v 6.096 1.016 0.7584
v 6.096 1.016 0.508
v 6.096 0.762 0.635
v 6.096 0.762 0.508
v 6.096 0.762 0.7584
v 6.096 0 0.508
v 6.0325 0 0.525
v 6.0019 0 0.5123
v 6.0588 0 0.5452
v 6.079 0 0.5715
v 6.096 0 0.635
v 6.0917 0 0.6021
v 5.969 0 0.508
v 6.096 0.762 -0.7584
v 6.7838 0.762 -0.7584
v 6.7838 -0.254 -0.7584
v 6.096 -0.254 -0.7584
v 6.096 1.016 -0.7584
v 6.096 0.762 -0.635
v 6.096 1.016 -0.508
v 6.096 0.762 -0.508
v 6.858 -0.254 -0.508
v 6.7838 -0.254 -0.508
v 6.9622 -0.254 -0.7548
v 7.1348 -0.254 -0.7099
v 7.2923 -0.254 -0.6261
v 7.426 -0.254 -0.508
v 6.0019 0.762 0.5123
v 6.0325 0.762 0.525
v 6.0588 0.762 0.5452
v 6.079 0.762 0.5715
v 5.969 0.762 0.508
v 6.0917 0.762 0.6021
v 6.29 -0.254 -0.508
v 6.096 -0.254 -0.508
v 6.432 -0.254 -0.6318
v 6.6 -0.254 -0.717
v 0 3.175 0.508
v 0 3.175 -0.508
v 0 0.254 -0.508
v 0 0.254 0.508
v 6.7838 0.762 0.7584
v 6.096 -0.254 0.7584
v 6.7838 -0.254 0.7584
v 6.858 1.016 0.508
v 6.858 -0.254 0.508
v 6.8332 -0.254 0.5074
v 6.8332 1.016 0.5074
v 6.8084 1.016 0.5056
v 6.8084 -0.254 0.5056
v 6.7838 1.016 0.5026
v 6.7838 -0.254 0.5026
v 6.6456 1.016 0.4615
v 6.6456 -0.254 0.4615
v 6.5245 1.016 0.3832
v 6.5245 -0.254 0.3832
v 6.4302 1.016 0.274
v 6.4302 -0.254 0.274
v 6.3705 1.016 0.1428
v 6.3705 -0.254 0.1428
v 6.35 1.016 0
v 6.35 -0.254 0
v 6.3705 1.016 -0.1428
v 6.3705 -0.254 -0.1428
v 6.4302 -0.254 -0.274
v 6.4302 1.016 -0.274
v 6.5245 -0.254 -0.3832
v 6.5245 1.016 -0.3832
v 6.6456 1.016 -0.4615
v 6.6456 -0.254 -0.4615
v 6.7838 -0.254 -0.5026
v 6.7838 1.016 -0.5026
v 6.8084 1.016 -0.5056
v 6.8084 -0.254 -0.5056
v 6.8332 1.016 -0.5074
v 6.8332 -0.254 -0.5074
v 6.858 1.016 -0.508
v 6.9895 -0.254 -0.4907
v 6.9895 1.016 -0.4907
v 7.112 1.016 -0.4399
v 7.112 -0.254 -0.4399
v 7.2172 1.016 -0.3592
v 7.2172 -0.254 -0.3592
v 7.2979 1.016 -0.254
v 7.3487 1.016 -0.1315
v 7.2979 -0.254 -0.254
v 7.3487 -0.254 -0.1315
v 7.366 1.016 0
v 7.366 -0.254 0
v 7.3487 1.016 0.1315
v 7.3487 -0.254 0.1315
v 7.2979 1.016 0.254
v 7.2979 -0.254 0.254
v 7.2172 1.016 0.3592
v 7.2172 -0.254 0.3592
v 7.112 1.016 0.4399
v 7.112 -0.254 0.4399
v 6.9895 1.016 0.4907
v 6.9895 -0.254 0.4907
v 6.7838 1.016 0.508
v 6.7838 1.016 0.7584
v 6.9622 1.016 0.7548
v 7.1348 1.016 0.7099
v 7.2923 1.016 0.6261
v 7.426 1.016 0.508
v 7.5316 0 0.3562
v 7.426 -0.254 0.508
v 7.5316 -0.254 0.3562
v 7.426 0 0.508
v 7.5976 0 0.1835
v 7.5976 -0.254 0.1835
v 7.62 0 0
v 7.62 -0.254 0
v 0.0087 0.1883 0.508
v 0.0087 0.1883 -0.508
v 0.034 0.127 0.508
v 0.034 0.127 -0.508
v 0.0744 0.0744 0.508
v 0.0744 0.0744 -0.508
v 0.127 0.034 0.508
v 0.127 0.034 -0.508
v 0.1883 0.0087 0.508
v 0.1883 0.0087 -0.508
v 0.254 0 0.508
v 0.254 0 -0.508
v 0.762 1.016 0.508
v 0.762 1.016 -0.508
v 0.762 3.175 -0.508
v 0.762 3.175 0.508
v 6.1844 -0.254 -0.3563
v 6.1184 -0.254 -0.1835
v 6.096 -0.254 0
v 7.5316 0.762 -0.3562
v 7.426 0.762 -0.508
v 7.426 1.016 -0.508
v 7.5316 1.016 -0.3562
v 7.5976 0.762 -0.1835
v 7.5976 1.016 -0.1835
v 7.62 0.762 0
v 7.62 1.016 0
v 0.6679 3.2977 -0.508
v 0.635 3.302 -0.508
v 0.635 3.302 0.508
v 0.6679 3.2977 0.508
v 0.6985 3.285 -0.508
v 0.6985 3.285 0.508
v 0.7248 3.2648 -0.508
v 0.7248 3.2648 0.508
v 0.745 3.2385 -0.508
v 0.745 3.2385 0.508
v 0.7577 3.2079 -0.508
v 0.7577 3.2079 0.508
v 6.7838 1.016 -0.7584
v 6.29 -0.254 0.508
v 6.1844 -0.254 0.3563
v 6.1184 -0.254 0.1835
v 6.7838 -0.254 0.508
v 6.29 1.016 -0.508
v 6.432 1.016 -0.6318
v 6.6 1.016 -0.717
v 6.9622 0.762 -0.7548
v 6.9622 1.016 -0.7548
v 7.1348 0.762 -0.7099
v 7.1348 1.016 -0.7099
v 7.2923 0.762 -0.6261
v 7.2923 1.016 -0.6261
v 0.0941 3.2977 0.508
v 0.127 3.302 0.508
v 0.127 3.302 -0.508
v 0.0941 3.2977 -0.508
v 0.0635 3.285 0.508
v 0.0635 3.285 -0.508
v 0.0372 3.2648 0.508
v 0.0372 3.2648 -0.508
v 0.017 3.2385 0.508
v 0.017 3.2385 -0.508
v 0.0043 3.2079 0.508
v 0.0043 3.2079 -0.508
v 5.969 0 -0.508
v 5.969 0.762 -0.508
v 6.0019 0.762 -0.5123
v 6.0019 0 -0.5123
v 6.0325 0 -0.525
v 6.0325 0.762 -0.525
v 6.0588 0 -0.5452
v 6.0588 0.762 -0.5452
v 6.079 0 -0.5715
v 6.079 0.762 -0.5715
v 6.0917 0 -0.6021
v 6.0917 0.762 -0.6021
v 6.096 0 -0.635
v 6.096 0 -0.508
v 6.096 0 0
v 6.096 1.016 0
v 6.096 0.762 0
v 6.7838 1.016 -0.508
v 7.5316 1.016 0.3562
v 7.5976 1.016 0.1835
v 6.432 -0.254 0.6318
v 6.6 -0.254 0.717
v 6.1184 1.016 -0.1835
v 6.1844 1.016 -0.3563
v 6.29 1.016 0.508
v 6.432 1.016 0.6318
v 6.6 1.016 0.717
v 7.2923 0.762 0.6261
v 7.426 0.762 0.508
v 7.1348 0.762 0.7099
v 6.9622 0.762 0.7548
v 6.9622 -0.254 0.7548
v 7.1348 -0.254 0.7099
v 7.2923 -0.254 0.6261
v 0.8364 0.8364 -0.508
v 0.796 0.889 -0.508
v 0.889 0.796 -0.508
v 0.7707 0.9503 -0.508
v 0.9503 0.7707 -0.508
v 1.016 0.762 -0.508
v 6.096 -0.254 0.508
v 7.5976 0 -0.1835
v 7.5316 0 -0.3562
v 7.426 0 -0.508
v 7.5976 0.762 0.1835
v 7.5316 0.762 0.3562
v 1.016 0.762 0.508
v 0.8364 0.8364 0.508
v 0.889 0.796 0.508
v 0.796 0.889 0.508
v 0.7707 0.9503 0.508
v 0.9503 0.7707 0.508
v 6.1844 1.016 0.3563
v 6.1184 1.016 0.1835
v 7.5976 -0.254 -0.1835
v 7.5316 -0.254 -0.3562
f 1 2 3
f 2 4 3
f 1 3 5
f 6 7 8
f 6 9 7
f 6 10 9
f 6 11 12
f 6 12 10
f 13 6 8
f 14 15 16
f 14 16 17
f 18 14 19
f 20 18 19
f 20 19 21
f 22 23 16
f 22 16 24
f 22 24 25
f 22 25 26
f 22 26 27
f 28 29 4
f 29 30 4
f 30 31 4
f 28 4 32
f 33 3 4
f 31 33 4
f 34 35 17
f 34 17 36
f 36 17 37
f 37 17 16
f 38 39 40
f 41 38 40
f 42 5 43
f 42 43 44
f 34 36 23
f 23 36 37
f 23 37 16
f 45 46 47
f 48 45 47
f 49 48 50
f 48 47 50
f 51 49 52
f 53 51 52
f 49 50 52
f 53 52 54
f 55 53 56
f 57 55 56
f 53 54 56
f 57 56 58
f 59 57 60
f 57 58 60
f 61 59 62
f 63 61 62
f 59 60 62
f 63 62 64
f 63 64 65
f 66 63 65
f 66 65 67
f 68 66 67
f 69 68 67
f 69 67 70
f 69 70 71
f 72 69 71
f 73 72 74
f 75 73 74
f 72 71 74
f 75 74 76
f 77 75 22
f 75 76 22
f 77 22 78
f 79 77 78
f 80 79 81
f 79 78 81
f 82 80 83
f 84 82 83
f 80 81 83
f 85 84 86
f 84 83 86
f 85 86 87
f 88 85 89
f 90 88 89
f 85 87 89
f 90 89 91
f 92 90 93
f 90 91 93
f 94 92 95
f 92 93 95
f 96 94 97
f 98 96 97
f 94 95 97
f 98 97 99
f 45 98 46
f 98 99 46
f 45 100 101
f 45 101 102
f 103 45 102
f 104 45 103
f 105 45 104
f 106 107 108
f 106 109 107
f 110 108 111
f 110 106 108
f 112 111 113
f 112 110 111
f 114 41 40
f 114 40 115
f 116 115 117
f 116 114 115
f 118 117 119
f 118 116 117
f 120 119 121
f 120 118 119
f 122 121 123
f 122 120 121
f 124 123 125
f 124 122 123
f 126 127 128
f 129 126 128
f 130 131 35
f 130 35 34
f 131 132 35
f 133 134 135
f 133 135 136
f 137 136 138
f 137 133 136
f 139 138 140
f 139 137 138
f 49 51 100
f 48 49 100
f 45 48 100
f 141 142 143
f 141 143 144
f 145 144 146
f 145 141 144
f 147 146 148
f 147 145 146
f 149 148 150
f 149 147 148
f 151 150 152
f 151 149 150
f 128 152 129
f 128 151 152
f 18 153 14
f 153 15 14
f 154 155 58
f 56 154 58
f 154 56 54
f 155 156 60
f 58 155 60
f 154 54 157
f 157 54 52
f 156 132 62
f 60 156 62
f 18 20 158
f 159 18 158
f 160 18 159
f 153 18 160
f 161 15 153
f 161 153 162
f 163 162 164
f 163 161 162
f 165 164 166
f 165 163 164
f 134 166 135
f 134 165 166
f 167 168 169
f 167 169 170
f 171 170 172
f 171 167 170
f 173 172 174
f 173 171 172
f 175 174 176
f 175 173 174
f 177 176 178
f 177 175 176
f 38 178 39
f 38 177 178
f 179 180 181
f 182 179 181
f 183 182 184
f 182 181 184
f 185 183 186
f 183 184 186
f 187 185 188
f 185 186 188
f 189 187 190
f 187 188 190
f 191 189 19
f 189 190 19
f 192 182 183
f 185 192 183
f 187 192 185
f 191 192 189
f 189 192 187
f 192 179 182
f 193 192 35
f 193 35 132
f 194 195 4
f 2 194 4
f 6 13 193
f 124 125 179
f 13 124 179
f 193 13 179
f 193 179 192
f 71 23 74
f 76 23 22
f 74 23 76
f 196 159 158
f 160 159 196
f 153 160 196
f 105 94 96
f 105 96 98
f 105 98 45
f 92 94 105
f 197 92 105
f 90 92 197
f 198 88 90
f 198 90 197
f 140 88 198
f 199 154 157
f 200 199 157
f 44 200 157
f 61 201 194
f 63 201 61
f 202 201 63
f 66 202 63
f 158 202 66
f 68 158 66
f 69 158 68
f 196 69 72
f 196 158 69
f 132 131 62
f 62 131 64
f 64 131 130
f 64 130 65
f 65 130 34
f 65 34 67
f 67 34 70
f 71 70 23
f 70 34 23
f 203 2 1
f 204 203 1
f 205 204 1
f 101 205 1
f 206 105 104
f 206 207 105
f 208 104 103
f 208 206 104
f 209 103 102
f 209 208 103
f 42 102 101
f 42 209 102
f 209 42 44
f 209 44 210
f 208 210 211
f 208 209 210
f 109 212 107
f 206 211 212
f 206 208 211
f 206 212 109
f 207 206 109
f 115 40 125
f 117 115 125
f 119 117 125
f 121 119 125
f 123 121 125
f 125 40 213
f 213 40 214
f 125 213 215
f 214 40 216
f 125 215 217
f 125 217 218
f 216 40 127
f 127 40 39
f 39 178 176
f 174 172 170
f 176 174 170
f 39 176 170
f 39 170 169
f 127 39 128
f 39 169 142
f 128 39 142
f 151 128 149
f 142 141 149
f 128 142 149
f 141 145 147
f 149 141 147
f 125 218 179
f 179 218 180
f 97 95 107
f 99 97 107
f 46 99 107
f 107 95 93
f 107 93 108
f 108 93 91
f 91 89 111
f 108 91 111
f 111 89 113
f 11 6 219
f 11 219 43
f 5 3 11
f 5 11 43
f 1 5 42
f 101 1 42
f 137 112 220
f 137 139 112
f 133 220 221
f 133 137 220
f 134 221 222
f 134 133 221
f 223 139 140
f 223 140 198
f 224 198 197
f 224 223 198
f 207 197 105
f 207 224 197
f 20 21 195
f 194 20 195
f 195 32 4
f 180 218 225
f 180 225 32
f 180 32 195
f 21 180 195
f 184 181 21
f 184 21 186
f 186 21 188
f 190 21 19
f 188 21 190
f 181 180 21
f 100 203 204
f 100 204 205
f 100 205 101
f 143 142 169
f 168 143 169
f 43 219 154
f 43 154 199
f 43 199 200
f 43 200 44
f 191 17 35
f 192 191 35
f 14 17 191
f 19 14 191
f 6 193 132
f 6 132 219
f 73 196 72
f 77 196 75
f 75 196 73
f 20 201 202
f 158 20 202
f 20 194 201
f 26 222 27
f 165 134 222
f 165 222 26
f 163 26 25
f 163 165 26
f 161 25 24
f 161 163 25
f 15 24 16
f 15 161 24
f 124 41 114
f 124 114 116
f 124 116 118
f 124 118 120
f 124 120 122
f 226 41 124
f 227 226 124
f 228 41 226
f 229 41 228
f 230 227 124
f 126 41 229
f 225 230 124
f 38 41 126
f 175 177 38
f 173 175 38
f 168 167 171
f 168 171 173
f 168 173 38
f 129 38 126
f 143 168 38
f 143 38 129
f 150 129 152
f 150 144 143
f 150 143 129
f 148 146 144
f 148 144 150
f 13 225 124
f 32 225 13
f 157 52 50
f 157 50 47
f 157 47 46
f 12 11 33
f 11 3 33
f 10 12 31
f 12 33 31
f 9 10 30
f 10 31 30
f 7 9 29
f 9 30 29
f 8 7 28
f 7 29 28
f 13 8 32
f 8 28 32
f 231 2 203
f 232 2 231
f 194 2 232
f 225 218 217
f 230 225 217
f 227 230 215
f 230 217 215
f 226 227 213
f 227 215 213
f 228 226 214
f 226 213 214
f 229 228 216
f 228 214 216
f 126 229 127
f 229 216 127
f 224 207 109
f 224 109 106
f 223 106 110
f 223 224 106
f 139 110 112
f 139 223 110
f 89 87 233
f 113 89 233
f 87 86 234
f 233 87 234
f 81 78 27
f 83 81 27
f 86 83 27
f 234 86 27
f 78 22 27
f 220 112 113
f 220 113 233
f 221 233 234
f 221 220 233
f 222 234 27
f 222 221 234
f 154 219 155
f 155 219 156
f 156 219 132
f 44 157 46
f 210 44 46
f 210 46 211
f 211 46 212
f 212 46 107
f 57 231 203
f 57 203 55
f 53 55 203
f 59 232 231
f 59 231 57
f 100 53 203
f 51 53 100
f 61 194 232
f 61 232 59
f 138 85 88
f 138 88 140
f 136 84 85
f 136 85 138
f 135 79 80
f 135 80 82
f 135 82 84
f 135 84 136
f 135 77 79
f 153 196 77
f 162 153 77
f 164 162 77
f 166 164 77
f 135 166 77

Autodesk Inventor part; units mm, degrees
ref_plane "YZ Plane" through (0, 0, 0) normal (1, 0, 0) x (0, 1, 0)
ref_plane "XZ Plane" through (0, 0, 0) normal (0, 1, 0) x (-1, 0, 0)
ref_plane "XY Plane" through (0, 0, 0) normal (0, 0, 1) x (1, 0, 0)
sketch "Sketch1" plane through (0, 0, 0) normal (0, 0, 1) x (1, 0, 0)
  line L0 (0, 4.0132) -> (0, -0.9652) projected
  line L1 (-1.524, 0) -> (9.144, 0) projected
  line L2 (7.62, 0) -> (0, 0)
  line L3 (0, 0) -> (0, 0.762)
  line L4 (0, 0.762) -> (7.62, 0.762)
  line L5 (7.62, 0.762) -> (7.62, 0)
  line L6 (0, 0.762) -> (0.762, 0.762)
  line L7 (0.762, 0.762) -> (0.762, 3.302)
  line L8 (0.762, 3.302) -> (0, 3.302)
  line L9 (0, 3.302) -> (0, 0.762)
  line L10 (6.096, -0.254) -> (7.62, -0.254)
  line L11 (7.62, -0.254) -> (7.62, 1.016)
  line L12 (7.62, 1.016) -> (6.096, 1.016)
  line L13 (6.096, 1.016) -> (6.096, -0.254)
  line L14 (6.096, -0.254) -> (7.62, 1.016) construction
  line L15 (7.62, -0.254) -> (6.096, 1.016) construction
  line L16 (0, 0.381) -> (7.62, 0.381) construction
  point P0 (6.858, 0.381)
  dimension "d0" = 0.762
  dimension "d1" = 0.762
  dimension "d2" = 3.302
  dimension "d4" = 1.27
  dimension "d5" = 1.524
  dimension "d6" = 6.858
  dimension "d7" = 0
extrude "Extrusion1" add sketch "Sketch1" along normal mid plane 1.016 contours L8 L7 L4 L0 | L4 L13 L1 L0 | L13 L4 L5 L1
sketch "Sketch2" plane through (0.762, 0.762, 0.508) normal (0, 1, 0) x (1, 0, 0)
  line L0 (-0.762, 1.5748) -> (-0.762, -0.5588) projected
  line L1 (8.382, 0.508) -> (-2.286, 0.508) projected
  line L2 (6.858, 1.016) -> (6.858, 0) projected
  circle A0 centre (6.096, 0.508) radius 0.762
  line L3 (0, 1.016) -> (6.858, 1.016) projected
  line L4 (6.858, 0) -> (0, 0) projected
  line L5 (6.664, 0) -> (6.858, 0)
  line L6 (6.858, 0) -> (6.858, 1.016)
  line L7 (6.858, 1.016) -> (6.664, 1.016)
  line L8 (5.334, -0.2504) -> (6.0218, -0.2504)
  line L9 (6.0218, -0.2504) -> (6.0218, 1.2664)
  line L10 (6.0218, 1.2664) -> (5.334, 1.2664)
  line L11 (5.334, 1.2664) -> (5.334, -0.2504)
  line L12 (5.334, -0.2504) -> (6.0218, 1.2664) construction
  line L13 (6.0218, -0.2504) -> (5.334, 1.2664) construction
  point P0 (-0.762, 0.508)
  point P1 (5.6779, 0.508)
  dimension "d10" = 1.524
  dimension "d30" = 6.096
extrude "Extrusion2" add sketch "Sketch2" against normal blind 1.016 and the other way blind 0.254 contours A0 L4 L9 L1 | L1 L9 L3 A0 | L9 L4 A0 L1 | L1 A0 L3 L9 | L3 L9 A0 | A0 L9 L4 | L11 L3 A0 | A0 L4 L11 | L9 A0 L4 | L3 A0 L9 | A0 L3 L11 L10 | L8 L11 L4 A0
extrude "Extrusion3" cut sketch "Sketch2" against normal up to next contours A0 L3 L2 | L2 L4 A0
hole "Hole1" at (6.858, 1.016, 0) direction (0, -1, 0) diameter 1.016 end through all
fillet "Fillet2" radius 0.254 2 edges at (0.762, 0.762, 0) (0, 0, 0)
fillet "Fillet3" radius 0.127 2 edges at (6.096, 0.381, 0.508) (6.096, 0.381, -0.508)
fillet "Fillet4" radius 0.127 2 edges at (0, 3.302, 0) (0.762, 3.302, 0)
properties part number "J007870 GRIN LENS HOLDER 1MM DIA Rev -" material "STAINLESS STEEL, 316"
